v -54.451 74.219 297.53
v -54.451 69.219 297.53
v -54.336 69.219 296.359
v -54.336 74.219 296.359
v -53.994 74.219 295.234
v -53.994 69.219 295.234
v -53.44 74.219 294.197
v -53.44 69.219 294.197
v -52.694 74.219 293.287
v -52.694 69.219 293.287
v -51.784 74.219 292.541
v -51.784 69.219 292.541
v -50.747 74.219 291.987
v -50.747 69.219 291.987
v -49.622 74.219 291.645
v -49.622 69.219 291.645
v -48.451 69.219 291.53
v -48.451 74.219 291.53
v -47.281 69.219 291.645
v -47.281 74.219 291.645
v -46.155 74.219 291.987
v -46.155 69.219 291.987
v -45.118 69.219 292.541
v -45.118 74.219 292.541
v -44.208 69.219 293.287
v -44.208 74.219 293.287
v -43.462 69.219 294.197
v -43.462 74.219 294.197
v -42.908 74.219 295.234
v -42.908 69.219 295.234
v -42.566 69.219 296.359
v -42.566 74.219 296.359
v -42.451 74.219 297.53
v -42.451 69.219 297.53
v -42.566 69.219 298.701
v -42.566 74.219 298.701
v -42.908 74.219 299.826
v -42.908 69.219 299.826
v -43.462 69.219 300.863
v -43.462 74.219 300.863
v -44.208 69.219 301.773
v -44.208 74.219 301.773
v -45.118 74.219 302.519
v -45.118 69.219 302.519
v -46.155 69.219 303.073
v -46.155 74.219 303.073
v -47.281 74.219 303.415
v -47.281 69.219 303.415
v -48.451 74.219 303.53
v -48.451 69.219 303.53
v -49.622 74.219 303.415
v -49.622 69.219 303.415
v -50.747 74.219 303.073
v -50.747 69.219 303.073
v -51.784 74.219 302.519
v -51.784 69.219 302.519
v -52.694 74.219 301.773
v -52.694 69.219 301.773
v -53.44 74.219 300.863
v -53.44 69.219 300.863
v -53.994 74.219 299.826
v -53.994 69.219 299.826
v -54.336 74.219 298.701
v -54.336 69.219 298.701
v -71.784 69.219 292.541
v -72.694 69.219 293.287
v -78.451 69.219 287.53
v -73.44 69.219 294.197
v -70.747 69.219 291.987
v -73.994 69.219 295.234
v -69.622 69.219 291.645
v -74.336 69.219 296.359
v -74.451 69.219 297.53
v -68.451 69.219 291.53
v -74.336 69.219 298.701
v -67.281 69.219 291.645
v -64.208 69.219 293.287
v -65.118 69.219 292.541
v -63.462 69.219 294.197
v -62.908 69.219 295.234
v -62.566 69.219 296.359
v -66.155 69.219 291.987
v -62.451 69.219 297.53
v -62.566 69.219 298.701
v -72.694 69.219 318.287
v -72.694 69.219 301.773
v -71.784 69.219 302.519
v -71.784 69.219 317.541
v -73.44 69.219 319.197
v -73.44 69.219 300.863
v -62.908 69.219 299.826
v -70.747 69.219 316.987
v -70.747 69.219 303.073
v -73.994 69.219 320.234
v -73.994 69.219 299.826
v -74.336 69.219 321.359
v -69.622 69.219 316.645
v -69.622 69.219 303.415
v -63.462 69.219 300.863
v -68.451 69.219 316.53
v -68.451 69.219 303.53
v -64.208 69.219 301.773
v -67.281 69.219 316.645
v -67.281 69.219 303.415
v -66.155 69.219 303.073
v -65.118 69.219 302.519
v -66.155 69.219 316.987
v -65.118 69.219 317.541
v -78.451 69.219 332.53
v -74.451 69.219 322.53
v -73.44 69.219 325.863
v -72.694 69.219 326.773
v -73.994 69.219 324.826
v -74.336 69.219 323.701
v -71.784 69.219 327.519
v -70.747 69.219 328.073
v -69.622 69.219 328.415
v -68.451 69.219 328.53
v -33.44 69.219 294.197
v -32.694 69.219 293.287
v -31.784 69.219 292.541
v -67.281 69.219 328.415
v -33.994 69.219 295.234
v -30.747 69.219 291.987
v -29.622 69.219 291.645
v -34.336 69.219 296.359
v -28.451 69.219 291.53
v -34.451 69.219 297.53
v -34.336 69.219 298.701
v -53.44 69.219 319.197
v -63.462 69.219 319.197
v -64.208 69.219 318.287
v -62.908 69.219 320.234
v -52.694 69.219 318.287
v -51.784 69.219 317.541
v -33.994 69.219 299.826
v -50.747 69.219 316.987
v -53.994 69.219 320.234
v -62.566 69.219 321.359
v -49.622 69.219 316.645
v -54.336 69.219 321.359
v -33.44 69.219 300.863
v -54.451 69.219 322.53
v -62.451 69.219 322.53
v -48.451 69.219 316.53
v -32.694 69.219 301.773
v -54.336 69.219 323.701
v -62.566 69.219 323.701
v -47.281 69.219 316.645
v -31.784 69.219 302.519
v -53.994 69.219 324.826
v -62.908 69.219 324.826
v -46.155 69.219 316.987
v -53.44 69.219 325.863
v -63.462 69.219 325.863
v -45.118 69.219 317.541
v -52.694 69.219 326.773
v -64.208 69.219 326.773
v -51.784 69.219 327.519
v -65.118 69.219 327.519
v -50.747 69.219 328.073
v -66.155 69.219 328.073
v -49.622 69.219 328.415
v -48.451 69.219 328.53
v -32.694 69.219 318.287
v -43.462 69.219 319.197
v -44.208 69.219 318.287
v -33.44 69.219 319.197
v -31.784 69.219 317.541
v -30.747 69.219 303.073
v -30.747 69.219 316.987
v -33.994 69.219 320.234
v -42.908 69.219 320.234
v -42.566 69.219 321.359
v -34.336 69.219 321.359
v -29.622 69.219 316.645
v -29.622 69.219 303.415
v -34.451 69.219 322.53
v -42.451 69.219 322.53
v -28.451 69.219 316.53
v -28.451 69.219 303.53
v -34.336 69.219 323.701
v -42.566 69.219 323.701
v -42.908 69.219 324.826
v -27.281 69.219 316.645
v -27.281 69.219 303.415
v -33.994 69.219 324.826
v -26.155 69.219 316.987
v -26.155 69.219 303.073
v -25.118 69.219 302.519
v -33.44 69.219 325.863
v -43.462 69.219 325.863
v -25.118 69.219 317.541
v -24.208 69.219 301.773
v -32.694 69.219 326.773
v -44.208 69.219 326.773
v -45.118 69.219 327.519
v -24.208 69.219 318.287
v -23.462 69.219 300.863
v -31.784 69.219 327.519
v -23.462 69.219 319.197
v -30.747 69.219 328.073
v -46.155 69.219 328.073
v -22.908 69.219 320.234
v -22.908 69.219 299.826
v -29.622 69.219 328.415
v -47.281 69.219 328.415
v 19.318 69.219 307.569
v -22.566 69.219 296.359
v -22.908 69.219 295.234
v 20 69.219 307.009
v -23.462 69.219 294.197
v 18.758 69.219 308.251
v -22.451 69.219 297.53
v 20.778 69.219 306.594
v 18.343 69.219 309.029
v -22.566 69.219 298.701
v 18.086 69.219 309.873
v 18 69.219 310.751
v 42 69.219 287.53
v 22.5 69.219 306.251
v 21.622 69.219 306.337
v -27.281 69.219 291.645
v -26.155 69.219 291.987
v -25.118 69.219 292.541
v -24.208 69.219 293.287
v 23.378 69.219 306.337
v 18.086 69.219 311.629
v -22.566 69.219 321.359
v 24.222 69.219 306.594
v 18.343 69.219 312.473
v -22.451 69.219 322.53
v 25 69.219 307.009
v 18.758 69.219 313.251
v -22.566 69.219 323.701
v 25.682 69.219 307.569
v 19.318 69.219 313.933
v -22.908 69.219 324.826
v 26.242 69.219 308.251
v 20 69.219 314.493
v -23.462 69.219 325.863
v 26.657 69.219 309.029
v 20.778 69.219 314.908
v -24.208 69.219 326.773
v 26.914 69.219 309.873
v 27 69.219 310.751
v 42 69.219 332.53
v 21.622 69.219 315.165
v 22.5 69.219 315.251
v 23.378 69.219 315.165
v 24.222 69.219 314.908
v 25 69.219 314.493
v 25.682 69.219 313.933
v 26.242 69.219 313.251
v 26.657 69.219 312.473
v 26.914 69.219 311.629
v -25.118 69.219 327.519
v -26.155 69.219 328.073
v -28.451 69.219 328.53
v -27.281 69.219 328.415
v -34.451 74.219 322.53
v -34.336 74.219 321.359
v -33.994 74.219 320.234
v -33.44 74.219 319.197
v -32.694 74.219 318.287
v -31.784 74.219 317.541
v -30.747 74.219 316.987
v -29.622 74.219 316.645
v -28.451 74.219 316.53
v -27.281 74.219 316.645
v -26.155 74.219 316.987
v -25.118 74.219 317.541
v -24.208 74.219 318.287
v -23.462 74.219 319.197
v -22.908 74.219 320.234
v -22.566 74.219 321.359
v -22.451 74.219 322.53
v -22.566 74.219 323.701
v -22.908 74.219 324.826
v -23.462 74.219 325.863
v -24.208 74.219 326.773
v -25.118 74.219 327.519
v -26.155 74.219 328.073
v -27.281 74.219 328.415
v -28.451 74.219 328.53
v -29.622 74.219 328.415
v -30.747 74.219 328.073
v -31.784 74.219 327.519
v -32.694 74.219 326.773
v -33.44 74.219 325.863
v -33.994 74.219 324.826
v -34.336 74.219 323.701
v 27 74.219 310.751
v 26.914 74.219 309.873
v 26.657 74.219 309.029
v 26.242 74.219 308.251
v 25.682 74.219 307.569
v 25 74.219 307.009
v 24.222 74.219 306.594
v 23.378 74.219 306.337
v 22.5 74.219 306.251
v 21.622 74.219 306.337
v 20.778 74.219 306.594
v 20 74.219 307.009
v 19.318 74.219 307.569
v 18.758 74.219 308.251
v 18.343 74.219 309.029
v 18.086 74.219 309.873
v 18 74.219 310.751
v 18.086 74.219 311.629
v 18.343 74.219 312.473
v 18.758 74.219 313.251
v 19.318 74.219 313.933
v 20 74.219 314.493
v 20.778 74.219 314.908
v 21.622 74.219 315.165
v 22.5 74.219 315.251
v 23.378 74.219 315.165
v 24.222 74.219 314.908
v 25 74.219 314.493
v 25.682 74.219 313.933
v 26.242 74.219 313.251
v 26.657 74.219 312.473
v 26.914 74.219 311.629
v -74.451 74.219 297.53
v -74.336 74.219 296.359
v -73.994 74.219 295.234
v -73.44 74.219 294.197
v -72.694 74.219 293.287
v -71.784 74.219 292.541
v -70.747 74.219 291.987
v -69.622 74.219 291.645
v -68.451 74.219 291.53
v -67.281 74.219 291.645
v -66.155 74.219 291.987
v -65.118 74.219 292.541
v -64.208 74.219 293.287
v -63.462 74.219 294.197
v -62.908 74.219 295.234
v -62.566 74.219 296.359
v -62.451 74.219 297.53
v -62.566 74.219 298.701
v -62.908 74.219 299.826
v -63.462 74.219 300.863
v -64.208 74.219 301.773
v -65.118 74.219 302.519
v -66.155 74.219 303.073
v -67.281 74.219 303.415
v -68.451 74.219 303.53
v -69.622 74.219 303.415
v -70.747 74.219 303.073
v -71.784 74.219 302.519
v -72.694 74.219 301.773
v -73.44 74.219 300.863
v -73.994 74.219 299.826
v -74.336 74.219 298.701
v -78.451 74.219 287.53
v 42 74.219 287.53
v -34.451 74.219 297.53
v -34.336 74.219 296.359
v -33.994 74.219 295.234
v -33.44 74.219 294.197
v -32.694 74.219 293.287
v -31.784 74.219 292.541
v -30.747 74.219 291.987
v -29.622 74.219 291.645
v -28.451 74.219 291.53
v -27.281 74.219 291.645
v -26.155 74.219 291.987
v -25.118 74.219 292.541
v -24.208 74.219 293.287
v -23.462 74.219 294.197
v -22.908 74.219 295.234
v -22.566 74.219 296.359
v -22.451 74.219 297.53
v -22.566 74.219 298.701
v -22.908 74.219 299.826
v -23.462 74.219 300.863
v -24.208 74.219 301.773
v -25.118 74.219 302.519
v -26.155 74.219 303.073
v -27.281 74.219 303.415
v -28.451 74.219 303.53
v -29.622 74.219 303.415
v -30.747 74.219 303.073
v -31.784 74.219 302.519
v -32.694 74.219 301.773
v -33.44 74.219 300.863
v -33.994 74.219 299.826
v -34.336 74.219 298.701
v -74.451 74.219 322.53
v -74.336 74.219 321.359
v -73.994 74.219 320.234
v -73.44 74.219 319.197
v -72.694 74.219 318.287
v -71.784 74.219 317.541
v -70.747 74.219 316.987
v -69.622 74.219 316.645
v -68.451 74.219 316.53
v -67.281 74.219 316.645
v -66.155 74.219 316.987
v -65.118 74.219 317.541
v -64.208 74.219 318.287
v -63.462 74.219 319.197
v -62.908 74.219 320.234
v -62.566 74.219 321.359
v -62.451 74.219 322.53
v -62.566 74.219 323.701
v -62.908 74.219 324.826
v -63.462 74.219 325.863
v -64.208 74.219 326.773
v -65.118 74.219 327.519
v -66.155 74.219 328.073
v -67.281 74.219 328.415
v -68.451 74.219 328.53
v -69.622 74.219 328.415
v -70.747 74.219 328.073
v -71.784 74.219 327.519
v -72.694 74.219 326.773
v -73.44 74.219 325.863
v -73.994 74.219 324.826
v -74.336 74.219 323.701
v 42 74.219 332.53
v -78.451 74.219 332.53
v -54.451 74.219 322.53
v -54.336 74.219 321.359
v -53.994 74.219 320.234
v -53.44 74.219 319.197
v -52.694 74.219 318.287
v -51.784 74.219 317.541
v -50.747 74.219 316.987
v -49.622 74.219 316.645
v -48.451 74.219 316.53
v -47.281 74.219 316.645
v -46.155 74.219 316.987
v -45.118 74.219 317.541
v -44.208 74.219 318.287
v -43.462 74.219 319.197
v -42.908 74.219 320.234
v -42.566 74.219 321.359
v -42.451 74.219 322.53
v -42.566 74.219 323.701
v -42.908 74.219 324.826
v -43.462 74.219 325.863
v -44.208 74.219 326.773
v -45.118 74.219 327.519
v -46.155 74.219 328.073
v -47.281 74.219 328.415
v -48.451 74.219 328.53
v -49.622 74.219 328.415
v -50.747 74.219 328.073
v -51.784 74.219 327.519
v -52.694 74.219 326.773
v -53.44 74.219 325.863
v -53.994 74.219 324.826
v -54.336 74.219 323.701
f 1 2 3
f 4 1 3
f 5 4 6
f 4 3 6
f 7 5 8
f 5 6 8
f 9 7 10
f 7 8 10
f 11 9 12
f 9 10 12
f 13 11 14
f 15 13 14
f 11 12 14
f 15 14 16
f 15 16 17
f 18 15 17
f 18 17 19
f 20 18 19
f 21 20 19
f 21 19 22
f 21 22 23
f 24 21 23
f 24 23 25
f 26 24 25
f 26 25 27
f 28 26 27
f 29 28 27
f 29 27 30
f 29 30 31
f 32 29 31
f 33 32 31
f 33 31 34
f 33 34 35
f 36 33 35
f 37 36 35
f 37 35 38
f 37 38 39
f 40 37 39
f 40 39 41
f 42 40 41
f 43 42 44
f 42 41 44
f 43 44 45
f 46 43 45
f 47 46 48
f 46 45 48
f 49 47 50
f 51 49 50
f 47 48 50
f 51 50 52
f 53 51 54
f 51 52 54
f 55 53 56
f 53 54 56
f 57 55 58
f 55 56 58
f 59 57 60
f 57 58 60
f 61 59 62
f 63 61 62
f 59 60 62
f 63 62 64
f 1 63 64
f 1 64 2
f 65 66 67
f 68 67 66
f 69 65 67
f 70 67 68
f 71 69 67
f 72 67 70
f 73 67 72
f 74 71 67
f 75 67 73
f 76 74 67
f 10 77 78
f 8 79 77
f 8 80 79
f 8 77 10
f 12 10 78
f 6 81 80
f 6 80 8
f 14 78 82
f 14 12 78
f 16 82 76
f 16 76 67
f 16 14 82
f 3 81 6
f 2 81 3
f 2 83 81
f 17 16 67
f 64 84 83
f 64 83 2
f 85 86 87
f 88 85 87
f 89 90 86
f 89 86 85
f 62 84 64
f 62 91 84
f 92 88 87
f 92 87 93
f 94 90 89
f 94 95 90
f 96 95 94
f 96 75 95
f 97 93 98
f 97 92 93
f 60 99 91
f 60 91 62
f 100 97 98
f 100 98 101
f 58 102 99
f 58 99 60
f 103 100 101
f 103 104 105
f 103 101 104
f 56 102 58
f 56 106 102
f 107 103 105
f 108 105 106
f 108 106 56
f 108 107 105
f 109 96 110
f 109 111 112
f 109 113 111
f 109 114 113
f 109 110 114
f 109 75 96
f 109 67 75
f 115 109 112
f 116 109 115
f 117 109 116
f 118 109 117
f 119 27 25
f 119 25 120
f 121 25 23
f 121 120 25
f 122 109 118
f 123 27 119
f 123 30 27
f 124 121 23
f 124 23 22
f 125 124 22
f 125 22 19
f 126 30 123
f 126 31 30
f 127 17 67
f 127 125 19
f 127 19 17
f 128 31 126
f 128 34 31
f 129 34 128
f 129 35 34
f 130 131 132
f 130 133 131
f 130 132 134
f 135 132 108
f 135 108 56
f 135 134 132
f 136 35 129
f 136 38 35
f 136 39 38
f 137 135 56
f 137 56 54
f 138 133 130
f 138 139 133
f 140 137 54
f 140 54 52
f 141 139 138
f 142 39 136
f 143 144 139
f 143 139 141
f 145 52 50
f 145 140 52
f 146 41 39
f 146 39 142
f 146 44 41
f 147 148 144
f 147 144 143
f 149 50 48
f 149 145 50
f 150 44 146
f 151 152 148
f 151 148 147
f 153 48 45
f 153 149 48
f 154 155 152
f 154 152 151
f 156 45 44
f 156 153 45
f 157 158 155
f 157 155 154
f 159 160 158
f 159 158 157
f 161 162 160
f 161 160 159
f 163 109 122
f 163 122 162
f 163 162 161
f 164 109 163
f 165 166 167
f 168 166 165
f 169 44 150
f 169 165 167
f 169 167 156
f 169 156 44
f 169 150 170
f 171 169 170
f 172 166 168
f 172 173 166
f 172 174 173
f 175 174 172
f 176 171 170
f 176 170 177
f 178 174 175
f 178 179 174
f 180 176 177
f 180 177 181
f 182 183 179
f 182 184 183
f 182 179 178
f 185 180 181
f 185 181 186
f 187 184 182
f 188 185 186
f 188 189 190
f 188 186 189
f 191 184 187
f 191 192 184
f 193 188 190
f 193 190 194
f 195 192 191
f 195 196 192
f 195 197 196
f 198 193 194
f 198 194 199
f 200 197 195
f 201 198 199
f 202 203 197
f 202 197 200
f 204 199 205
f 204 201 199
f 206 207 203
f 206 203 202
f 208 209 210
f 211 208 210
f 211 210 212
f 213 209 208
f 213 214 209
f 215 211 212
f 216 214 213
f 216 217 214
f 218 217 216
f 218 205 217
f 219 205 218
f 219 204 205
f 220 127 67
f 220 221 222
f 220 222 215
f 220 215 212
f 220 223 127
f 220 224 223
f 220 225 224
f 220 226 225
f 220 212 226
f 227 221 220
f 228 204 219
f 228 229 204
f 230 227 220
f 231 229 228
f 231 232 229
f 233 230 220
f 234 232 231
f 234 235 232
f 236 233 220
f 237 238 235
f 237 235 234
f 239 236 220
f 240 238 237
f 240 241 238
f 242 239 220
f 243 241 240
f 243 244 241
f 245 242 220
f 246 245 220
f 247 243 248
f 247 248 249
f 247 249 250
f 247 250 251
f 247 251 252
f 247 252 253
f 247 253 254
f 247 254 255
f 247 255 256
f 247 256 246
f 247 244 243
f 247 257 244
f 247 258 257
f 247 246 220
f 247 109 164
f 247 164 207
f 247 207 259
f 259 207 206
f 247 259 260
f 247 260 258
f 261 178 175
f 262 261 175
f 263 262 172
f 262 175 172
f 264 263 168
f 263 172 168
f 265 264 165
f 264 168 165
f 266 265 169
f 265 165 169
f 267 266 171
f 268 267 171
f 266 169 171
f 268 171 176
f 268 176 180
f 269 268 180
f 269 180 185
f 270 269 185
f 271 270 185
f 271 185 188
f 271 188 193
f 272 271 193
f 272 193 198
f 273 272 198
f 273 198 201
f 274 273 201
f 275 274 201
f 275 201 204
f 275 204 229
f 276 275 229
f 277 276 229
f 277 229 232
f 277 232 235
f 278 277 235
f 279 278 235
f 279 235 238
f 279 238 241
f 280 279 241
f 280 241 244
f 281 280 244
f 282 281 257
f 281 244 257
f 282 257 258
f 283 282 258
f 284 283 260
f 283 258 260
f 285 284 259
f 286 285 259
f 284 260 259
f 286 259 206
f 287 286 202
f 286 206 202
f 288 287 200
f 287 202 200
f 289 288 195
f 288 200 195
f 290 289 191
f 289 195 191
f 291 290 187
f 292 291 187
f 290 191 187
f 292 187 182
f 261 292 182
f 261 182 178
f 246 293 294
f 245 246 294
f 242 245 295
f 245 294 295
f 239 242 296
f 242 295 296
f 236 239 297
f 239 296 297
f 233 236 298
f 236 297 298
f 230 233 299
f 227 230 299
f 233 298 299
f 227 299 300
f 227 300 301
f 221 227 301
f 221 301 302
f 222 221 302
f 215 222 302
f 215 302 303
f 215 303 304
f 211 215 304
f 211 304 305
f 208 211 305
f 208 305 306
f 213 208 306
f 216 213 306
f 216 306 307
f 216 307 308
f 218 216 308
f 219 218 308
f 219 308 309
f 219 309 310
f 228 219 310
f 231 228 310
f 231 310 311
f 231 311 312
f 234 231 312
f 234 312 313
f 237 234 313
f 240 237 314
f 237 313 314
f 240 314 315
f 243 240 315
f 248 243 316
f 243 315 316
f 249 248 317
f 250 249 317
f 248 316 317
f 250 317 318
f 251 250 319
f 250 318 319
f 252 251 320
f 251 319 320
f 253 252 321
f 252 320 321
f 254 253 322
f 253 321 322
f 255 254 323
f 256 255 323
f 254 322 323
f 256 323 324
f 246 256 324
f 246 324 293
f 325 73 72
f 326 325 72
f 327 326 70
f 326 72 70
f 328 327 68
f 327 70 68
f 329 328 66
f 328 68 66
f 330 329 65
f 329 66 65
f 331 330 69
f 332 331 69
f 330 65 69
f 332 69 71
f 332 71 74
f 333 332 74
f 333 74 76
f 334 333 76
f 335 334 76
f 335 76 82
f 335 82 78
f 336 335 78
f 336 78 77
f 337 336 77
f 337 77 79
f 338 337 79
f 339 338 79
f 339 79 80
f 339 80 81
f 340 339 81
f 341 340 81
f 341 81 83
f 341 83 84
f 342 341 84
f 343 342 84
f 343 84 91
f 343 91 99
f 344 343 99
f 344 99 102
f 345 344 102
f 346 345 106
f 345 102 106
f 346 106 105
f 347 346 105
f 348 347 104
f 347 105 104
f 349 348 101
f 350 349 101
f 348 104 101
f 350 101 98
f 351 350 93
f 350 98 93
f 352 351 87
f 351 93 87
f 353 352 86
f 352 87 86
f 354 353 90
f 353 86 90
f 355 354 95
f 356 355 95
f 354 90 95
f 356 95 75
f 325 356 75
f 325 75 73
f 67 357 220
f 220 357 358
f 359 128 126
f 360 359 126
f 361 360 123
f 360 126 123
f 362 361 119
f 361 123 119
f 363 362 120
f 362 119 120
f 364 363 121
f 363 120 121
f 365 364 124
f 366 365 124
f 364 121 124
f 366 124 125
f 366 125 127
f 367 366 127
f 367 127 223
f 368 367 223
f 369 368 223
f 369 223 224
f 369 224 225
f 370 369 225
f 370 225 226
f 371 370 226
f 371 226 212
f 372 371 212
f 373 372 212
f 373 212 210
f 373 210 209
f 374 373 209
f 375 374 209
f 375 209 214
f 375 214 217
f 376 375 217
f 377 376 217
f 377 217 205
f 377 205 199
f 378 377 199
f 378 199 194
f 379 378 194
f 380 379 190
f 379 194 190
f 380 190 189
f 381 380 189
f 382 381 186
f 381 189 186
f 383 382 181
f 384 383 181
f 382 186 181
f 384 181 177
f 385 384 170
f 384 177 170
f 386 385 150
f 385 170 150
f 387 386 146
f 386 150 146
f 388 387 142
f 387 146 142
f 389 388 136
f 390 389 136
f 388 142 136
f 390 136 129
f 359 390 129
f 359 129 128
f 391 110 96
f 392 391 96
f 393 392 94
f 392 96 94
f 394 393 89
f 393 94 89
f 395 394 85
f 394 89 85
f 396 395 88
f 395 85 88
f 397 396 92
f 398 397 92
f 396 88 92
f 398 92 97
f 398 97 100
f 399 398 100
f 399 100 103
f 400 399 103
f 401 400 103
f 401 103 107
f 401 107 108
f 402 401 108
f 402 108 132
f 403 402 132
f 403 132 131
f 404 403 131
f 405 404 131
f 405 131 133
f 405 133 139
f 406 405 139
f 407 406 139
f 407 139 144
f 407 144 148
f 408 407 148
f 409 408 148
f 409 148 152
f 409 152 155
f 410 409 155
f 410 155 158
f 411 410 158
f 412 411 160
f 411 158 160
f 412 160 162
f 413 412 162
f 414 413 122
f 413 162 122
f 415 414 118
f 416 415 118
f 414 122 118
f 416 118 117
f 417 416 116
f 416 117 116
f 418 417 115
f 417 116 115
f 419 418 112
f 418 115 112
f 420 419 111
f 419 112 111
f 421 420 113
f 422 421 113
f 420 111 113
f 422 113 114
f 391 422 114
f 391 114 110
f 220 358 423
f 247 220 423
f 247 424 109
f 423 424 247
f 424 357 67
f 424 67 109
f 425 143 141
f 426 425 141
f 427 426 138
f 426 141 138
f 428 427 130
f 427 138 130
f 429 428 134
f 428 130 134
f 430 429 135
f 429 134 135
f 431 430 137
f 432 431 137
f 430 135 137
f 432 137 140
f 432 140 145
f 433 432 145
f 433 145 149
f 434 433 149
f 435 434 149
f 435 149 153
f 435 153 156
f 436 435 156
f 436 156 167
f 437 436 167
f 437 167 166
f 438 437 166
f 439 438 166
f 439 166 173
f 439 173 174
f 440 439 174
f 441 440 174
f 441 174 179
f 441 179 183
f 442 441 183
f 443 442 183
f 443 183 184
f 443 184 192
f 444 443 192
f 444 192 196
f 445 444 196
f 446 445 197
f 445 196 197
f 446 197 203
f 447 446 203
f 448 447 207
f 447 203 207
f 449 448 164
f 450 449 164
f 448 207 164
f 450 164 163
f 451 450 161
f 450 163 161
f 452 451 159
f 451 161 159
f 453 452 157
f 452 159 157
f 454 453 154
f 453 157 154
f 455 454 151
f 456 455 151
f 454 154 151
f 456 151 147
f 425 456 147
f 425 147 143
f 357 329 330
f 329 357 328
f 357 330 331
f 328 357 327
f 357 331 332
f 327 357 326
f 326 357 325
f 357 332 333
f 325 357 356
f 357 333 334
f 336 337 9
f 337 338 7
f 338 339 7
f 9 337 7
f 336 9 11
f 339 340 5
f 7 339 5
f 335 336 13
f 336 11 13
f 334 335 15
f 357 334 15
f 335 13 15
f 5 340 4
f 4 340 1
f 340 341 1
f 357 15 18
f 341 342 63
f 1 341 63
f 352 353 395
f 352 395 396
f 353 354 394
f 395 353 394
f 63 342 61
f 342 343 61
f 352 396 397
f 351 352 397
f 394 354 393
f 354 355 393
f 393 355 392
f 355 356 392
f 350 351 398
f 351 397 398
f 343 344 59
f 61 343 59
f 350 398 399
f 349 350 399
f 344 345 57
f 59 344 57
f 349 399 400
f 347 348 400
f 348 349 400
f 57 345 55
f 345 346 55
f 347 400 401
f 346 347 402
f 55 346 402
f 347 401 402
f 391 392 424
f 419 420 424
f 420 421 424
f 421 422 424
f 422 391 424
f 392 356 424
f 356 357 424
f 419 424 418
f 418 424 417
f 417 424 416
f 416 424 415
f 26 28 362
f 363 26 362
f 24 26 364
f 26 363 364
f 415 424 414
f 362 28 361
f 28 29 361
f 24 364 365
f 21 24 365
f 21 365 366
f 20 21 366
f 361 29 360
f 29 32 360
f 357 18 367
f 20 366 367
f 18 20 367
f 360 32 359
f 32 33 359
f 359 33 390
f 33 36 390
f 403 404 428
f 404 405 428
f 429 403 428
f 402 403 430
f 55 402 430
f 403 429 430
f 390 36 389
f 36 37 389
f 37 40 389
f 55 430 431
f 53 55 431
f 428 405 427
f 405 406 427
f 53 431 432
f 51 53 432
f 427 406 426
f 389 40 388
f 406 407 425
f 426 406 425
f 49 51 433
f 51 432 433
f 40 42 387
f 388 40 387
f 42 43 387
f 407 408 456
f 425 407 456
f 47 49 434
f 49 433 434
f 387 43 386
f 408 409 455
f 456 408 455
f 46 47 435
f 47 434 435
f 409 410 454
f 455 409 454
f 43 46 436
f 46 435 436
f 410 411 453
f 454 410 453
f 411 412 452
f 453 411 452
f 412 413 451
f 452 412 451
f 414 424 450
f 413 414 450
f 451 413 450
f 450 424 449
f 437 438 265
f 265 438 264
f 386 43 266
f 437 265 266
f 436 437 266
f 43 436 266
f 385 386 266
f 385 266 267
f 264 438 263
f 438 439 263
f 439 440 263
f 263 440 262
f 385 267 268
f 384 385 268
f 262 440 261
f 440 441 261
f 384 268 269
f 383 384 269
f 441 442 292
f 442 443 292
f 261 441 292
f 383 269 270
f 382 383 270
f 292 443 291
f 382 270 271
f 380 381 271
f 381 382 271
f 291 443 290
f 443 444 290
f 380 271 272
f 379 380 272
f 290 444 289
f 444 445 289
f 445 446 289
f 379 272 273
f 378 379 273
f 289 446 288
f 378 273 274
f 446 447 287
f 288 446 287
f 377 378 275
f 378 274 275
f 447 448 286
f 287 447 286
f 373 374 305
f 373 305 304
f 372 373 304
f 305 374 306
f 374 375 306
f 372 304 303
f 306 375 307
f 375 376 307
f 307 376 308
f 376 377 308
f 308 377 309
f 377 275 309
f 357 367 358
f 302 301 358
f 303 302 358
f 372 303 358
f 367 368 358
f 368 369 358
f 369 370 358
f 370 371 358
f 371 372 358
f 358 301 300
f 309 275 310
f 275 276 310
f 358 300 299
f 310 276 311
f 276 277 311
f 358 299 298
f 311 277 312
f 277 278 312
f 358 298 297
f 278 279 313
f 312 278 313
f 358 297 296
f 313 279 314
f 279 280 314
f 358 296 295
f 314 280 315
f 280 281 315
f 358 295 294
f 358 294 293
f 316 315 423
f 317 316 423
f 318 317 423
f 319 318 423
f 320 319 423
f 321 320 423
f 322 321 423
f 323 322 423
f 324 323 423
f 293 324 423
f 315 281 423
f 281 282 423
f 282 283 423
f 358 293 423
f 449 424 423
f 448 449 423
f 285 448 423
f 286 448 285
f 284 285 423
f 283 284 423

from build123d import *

# Parameters (mm, degrees)
SKETCH1_W                  = 120.45107664
SKETCH1_H                  = 45
BOSS_EXTRUDE1_DEPTH        = 5
F_12_0_12_DIAMETER_HOLE1_D = 12
F_9_0_9_DIAMETER_HOLE1_D   = 9


with BuildPart() as part:
    # Sketch1 → Boss-Extrude1 (new body)
    with BuildSketch(Plane.XZ.offset(-74.218719002)):
        with Locations((-18.22553832, 310.029969029)):
            Rectangle(SKETCH1_W, SKETCH1_H)
    extrude(amount=BOSS_EXTRUDE1_DEPTH)

    # Ø12.0 (12) Diameter Hole1 (through all)
    with Locations(Plane(origin=(0, 74.218719002, 0), x_dir=(1, 0, 0), z_dir=(0, 1, 0))):
        with Locations((-68.45107664, -322.529969029), (-68.45107664, -297.529969029), (-48.45107664, -322.529969029), (-28.45107664, -322.529969029), (-48.45107664, -297.529969029), (-28.45107664, -297.529969029)):
            Hole(F_12_0_12_DIAMETER_HOLE1_D / 2)

    # Ø9.0 (9) Diameter Hole1 (through all)
    with Locations(Plane(origin=(0, 69.218719002, 0), x_dir=(-1, 0, 0), z_dir=(0, -1, 0))):
        with Locations((-22.5, -310.751020034)):
            Hole(F_9_0_9_DIAMETER_HOLE1_D / 2)


solid = part.part
